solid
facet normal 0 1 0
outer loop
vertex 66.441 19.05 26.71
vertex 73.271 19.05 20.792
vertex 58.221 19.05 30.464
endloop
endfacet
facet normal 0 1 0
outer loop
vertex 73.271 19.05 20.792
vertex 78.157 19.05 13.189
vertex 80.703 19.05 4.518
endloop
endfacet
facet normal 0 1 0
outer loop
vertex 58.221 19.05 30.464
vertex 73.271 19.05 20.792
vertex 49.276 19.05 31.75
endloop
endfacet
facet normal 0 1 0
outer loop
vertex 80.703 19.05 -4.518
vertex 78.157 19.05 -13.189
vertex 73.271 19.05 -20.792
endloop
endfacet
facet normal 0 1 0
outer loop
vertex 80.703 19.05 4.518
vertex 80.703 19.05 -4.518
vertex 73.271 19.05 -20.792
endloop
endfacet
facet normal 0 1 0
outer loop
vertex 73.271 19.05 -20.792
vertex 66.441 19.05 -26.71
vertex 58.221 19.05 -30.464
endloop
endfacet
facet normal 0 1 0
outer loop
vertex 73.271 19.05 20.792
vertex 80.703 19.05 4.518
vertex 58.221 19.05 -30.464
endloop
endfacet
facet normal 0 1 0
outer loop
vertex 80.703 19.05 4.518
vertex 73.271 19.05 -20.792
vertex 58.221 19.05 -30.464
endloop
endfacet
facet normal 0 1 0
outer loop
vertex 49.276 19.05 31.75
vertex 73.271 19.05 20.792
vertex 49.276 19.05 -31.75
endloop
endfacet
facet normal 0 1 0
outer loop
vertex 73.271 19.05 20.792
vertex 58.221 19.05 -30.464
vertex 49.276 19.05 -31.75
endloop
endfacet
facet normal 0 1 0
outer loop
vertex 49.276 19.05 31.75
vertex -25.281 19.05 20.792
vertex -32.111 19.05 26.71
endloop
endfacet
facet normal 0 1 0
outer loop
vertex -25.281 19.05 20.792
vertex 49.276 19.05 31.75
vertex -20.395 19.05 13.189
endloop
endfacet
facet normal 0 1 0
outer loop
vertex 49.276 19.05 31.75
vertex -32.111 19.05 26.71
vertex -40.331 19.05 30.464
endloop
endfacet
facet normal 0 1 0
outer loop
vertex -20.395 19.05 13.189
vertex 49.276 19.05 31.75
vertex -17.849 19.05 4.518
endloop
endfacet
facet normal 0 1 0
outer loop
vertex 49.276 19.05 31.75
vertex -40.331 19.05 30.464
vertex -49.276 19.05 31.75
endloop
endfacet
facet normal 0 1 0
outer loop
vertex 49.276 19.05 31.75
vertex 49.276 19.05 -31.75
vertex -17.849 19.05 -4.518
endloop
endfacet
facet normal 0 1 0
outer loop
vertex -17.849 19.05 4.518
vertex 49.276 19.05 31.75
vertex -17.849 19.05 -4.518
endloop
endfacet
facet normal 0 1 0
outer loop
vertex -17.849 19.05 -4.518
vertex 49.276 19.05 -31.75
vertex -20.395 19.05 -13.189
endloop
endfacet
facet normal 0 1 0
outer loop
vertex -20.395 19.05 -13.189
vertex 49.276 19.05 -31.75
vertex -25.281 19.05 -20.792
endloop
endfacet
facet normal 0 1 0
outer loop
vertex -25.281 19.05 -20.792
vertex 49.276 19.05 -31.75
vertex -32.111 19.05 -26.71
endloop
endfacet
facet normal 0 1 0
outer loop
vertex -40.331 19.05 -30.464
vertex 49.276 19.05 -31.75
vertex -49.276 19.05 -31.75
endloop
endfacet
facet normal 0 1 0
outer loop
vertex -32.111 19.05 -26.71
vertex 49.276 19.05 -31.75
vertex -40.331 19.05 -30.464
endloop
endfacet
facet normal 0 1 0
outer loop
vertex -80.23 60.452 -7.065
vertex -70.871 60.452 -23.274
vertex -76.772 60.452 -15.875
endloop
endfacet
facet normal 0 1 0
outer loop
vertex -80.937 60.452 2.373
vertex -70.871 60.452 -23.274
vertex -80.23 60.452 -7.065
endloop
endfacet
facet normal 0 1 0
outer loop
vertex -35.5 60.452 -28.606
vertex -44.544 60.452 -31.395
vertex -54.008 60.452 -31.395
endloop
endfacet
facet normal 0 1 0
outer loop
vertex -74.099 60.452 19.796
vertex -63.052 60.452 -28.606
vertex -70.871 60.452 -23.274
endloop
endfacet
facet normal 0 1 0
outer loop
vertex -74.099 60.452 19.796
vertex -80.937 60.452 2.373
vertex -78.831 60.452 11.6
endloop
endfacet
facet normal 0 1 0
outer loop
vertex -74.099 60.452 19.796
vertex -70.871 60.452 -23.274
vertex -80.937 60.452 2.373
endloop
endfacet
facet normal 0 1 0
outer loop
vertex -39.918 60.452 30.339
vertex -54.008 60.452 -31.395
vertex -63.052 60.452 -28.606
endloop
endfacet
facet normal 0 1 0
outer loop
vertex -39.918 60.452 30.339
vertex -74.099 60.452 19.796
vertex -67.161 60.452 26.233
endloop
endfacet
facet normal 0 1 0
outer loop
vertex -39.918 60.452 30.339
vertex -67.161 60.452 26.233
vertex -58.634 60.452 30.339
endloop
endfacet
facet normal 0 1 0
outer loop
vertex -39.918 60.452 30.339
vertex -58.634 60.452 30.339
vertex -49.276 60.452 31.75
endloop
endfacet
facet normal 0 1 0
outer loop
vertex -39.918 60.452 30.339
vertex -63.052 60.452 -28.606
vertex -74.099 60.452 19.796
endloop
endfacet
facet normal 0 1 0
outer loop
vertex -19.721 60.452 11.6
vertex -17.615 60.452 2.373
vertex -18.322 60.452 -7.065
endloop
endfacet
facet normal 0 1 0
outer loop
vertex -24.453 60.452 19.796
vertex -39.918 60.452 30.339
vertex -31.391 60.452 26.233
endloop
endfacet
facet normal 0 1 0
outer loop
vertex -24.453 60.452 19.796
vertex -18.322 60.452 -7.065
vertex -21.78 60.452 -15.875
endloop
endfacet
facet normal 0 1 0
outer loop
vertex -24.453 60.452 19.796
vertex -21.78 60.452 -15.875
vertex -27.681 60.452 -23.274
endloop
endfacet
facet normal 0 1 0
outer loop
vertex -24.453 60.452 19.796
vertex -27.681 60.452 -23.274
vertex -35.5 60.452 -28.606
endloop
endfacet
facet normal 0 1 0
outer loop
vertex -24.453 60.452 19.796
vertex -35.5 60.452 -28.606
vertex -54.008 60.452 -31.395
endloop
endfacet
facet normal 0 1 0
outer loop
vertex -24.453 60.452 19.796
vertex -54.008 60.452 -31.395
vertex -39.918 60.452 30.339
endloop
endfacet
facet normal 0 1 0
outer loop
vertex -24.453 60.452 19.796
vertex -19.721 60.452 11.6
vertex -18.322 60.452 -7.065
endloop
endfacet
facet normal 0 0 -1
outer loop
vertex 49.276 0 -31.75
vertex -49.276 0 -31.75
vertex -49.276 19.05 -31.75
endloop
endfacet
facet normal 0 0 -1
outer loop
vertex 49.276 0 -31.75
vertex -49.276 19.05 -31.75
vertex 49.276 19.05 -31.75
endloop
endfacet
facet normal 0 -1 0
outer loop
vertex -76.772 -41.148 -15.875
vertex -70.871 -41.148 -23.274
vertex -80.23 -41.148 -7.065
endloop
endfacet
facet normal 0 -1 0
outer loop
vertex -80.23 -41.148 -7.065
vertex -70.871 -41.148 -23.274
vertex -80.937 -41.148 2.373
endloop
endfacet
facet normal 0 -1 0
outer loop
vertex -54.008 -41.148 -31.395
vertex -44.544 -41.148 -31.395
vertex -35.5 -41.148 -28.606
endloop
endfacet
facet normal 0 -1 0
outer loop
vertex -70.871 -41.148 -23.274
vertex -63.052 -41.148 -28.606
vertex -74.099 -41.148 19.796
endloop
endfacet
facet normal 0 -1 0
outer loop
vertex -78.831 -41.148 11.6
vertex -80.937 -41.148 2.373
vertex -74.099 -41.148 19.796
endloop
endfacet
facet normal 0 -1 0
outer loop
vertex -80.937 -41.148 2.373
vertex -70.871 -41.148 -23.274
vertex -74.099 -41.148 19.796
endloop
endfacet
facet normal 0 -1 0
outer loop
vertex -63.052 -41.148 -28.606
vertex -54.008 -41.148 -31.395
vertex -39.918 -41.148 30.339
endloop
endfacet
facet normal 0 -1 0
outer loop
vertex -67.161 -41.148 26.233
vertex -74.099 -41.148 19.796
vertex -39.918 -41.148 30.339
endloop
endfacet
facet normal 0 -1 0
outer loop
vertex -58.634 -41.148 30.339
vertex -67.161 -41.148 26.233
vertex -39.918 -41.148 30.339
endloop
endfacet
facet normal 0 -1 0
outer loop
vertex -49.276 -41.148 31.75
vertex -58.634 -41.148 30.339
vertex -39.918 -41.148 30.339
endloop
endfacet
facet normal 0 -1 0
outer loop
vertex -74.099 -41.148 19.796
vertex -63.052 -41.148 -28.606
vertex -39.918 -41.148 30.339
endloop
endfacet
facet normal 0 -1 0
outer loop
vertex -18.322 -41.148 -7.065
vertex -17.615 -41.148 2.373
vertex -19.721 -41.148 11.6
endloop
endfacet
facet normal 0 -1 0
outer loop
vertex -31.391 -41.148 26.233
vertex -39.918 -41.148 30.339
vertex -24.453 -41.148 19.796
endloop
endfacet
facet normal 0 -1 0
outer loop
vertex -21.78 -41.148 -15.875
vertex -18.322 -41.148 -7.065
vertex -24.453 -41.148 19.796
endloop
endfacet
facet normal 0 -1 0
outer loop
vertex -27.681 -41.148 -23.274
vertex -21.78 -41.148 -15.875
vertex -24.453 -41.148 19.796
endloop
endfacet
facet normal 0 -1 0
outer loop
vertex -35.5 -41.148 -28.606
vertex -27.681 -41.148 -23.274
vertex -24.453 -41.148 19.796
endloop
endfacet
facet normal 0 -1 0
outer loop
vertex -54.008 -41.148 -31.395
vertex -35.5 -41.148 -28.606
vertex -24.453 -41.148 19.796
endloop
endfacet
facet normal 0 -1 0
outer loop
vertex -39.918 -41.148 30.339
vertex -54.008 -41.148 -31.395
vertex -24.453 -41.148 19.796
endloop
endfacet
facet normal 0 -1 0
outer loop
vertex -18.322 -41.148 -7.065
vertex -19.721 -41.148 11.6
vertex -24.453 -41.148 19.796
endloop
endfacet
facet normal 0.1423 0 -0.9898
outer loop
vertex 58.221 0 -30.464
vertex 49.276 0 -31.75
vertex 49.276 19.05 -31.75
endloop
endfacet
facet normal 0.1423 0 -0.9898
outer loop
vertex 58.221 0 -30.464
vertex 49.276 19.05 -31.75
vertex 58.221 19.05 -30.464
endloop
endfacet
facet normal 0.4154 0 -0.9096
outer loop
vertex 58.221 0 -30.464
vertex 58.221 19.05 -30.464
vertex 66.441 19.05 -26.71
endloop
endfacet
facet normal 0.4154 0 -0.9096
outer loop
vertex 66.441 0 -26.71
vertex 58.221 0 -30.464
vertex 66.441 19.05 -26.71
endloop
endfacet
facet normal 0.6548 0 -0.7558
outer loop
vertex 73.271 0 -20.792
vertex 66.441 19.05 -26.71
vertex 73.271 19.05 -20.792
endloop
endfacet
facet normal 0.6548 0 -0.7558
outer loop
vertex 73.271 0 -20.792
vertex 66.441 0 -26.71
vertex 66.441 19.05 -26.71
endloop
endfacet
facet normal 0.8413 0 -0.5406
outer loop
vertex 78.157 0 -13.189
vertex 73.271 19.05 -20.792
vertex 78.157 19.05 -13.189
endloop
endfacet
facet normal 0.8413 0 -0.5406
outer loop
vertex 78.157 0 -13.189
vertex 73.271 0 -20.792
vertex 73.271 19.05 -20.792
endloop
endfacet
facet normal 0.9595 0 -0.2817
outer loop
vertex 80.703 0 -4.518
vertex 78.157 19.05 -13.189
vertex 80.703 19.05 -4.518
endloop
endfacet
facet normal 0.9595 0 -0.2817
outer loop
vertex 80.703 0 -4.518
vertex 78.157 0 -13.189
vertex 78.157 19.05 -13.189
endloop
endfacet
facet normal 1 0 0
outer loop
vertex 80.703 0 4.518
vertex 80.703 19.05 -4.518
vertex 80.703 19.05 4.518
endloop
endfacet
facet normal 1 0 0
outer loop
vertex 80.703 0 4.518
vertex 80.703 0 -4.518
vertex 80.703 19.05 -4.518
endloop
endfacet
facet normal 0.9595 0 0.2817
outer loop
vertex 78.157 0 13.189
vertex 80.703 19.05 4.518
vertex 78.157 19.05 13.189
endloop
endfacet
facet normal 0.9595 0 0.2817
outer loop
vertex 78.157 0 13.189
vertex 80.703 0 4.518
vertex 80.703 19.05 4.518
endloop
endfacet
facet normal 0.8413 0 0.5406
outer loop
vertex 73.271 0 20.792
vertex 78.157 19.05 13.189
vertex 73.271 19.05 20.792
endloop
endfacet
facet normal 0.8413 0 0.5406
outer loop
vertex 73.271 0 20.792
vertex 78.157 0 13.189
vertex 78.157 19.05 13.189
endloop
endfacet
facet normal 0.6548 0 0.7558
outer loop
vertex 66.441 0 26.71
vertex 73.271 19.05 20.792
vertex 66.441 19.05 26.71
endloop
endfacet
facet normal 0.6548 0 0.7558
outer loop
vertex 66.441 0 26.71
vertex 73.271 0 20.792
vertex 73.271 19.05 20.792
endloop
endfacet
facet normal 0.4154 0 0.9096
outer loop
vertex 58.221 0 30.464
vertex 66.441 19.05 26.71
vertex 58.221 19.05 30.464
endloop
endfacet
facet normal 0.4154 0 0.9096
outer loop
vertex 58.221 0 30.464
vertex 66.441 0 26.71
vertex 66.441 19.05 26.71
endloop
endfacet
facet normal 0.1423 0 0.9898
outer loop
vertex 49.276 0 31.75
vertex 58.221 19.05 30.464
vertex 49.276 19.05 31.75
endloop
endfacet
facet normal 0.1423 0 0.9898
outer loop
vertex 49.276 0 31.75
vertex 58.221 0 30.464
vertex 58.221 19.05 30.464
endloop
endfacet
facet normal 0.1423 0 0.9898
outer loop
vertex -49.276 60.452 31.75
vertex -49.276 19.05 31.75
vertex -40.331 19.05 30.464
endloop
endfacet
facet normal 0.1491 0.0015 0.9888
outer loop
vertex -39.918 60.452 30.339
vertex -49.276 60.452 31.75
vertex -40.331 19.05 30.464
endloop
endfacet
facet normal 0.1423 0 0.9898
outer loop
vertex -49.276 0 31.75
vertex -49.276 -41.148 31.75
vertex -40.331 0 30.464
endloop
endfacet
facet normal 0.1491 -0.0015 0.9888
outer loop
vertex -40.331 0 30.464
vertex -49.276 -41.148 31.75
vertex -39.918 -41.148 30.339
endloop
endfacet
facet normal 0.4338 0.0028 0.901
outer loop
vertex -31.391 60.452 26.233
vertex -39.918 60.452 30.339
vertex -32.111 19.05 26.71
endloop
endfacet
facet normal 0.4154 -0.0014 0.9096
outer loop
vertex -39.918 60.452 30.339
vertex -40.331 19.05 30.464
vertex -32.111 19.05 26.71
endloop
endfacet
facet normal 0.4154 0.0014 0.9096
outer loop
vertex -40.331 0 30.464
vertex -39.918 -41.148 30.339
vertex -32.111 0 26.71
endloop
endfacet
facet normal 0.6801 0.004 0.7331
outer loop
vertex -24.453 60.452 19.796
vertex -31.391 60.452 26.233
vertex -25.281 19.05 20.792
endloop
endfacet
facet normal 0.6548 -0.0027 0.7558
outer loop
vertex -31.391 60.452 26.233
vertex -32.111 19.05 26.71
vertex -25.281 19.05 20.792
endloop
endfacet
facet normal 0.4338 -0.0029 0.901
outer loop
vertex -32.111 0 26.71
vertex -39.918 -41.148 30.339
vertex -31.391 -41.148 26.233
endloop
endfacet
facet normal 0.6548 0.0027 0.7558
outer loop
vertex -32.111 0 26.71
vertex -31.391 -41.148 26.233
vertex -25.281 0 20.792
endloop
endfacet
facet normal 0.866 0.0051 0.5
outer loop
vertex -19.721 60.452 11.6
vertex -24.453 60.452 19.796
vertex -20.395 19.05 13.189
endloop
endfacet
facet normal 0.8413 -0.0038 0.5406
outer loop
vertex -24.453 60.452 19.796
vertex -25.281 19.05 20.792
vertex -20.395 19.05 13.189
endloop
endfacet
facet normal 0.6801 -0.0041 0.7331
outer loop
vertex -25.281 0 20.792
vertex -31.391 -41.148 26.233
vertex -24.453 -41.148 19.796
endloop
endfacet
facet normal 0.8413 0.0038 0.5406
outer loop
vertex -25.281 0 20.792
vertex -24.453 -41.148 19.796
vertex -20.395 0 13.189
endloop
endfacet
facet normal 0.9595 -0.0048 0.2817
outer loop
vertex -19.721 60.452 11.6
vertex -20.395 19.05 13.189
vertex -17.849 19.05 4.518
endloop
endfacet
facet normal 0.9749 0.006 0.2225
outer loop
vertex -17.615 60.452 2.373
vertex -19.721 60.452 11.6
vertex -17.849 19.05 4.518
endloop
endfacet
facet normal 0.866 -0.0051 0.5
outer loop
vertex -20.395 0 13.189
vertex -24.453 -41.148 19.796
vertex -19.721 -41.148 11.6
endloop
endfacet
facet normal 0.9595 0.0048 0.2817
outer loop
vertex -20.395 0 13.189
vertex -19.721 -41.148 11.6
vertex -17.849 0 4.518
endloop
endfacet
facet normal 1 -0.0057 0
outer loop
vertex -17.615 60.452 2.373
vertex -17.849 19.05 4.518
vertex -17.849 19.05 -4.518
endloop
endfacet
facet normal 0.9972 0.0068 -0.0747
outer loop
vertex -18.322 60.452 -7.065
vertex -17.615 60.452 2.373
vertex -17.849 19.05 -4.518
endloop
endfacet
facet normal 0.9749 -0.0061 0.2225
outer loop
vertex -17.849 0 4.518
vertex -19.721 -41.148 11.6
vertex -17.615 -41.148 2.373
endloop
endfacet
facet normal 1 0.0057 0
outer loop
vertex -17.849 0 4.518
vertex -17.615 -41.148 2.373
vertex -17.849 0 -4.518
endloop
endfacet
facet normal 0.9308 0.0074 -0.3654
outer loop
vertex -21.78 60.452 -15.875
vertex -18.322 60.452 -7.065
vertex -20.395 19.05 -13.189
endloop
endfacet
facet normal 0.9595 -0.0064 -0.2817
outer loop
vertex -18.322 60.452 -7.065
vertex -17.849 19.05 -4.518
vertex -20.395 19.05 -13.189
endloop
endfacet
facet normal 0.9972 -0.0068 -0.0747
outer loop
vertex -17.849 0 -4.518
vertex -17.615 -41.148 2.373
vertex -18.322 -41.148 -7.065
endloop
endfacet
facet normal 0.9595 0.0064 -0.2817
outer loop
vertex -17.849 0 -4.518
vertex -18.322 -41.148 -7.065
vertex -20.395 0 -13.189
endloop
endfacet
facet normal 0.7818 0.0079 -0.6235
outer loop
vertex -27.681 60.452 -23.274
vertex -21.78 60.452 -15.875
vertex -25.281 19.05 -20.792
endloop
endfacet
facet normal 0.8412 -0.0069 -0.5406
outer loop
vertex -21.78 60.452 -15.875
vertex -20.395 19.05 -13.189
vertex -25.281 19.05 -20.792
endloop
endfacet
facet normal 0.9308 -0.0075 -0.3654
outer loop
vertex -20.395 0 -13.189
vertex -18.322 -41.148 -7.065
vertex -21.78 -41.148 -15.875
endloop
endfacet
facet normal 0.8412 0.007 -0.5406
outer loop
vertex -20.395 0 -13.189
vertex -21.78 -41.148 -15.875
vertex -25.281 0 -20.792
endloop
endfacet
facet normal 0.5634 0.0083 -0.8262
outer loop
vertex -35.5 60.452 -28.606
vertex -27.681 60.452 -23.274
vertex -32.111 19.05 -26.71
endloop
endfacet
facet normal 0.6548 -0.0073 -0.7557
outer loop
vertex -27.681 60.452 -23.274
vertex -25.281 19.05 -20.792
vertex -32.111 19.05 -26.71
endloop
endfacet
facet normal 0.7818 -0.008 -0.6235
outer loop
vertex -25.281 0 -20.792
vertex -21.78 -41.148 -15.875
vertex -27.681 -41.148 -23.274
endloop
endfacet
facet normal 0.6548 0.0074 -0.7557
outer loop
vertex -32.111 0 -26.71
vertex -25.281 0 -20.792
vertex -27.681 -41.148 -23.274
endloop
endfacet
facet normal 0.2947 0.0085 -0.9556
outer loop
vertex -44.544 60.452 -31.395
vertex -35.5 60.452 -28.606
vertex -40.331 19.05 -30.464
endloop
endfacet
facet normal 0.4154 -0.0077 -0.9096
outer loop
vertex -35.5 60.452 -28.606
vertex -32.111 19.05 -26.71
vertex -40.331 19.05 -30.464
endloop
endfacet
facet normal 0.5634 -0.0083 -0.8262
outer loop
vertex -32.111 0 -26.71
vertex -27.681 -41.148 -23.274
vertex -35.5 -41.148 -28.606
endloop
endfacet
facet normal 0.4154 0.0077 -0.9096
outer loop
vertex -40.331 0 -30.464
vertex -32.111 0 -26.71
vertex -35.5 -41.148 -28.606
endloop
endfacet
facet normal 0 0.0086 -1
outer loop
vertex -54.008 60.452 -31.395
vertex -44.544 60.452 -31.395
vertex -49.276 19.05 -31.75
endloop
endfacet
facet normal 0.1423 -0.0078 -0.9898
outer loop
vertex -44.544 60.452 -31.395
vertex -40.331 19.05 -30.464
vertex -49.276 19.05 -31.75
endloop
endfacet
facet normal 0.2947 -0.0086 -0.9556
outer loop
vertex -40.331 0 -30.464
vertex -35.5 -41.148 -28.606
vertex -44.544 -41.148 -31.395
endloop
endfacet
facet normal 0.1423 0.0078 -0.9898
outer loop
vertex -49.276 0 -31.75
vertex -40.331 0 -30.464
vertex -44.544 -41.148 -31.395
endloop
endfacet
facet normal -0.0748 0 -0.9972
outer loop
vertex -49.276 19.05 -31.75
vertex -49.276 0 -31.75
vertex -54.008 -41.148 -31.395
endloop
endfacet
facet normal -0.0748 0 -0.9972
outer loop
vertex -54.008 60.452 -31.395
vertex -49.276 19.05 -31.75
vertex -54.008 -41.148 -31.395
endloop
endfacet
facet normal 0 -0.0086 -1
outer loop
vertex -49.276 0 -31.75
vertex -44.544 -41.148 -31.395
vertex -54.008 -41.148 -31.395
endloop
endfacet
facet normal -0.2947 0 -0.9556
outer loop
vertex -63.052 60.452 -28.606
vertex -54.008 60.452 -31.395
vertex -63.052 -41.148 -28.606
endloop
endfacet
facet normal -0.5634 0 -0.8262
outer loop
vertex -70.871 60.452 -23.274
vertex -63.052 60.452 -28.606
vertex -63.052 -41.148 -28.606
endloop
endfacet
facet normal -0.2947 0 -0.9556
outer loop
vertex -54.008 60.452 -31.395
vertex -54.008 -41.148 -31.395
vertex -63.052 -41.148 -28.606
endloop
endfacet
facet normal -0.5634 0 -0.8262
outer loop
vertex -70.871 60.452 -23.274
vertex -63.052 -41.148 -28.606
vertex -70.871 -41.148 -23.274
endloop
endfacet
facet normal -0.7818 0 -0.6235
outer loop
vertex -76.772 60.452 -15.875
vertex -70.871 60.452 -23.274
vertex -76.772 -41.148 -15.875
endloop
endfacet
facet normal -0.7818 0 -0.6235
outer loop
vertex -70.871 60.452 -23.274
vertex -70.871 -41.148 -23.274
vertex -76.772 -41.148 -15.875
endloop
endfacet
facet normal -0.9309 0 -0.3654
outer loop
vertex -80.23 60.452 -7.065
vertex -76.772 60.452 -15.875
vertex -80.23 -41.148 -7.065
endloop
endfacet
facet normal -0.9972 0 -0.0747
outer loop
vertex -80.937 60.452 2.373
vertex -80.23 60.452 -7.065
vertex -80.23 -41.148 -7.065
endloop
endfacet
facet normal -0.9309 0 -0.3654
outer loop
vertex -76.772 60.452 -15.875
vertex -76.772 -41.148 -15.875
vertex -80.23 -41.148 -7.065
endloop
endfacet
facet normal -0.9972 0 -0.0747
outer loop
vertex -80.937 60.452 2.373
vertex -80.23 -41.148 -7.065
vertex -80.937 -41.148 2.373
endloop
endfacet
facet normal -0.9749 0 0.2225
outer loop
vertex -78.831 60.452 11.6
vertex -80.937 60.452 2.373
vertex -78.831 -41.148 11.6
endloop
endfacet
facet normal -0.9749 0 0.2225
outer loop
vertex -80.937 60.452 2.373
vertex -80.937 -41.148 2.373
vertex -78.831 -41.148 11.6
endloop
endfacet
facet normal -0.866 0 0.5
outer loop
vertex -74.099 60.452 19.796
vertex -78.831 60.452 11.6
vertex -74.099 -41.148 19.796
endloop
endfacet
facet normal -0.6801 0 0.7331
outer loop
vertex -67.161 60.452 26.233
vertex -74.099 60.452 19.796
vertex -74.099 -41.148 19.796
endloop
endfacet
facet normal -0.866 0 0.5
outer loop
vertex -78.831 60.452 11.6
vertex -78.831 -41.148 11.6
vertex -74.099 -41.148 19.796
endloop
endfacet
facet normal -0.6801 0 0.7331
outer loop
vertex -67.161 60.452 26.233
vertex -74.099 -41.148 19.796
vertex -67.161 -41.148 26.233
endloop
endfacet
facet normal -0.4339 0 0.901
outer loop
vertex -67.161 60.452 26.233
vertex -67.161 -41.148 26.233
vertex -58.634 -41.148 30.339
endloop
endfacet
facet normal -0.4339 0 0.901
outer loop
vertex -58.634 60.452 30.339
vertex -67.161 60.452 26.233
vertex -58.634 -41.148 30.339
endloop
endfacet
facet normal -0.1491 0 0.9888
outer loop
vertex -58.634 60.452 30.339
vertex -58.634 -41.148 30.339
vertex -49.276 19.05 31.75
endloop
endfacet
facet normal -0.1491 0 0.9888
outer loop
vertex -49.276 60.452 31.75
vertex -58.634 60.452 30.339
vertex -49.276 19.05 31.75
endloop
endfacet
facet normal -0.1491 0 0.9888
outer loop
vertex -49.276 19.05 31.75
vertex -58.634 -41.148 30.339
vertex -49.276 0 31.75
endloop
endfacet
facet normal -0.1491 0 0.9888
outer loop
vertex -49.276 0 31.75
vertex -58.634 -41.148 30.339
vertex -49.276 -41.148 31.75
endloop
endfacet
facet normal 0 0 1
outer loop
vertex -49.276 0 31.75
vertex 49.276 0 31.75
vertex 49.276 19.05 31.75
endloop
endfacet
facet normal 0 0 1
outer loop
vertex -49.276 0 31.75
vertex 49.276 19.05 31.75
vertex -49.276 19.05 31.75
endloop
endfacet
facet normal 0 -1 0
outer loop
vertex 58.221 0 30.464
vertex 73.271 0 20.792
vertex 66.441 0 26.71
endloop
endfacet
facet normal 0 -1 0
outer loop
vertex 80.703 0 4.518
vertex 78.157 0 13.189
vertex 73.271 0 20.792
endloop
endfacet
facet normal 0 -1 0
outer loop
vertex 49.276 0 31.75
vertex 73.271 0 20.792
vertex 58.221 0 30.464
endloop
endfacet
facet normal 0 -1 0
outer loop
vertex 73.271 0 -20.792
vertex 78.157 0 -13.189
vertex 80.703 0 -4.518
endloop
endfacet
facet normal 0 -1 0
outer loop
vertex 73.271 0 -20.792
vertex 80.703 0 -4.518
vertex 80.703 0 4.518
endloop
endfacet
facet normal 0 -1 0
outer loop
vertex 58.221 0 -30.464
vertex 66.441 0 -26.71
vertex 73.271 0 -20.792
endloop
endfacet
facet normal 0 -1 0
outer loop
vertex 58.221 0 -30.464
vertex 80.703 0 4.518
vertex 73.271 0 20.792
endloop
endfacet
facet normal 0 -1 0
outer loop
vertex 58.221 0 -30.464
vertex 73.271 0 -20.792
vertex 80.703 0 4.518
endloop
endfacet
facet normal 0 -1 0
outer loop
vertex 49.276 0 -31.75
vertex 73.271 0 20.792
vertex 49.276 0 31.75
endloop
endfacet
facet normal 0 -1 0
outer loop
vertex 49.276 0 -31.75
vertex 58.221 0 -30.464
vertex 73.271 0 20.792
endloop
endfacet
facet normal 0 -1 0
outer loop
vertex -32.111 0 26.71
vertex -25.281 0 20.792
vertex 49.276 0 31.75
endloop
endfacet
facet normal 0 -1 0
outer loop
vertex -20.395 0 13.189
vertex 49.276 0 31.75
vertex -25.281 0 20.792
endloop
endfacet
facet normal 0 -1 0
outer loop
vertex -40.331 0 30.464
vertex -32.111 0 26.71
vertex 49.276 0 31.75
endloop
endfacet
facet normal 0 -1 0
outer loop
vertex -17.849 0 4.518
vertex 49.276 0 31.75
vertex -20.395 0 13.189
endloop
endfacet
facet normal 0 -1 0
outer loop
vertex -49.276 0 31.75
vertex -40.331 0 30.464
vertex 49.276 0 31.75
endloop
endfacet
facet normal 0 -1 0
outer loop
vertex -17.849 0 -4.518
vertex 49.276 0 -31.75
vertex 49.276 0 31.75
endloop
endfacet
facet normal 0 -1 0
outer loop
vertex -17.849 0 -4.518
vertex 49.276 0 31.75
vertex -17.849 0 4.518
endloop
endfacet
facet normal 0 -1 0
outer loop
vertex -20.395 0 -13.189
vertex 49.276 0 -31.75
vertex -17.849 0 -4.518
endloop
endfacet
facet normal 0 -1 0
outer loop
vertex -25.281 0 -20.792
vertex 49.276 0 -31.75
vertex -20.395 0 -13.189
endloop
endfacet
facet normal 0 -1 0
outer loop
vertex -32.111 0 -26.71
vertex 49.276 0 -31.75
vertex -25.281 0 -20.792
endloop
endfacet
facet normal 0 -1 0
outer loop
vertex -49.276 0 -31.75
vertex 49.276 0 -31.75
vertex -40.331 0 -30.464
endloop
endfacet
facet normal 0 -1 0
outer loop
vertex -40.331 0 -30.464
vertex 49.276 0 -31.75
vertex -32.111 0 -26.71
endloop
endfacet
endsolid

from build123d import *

# Parameters (mm, degrees)
BOSS_EXTRUDE1_DEPTH      = 19.05
SKETCH3_R                = 31.75
BOSS_EXTRUDE2_DEPTH      = 41.402
BOSS_EXTRUDE2_DEPTH_BACK = 60.198


with BuildPart() as part:
    # Sketch1 → Boss-Extrude1 (new body)
    with BuildSketch(Plane(origin=(0, 0, 0), x_dir=(1, 0, 0), z_dir=(0, 1, 0))):
        with BuildLine():
            Line((-49.276, 31.75), (49.276, 31.75))
            ThreePointArc((49.276, 31.75), (81.026, 0), (49.276, -31.75))
            Line((49.276, -31.75), (-49.276, -31.75))
            ThreePointArc((-49.276, -31.75), (-81.026, 0), (-49.276, 31.75))
        make_face()
    extrude(amount=BOSS_EXTRUDE1_DEPTH)

    # Sketch3 → Boss-Extrude2 (add, two sides)
    with BuildSketch(Plane(origin=(0, 19.05, 0), x_dir=(1, 0, 0), z_dir=(0, 1, 0))) as boss_extrude2_sk:
        with Locations(Location((-49.276, 0, 0), (0, 0, 270))):  # turned: the seam where the file's is
            Circle(SKETCH3_R)
    extrude(amount=BOSS_EXTRUDE2_DEPTH)
    extrude(boss_extrude2_sk.sketch, amount=-BOSS_EXTRUDE2_DEPTH_BACK)


solid = part.part
